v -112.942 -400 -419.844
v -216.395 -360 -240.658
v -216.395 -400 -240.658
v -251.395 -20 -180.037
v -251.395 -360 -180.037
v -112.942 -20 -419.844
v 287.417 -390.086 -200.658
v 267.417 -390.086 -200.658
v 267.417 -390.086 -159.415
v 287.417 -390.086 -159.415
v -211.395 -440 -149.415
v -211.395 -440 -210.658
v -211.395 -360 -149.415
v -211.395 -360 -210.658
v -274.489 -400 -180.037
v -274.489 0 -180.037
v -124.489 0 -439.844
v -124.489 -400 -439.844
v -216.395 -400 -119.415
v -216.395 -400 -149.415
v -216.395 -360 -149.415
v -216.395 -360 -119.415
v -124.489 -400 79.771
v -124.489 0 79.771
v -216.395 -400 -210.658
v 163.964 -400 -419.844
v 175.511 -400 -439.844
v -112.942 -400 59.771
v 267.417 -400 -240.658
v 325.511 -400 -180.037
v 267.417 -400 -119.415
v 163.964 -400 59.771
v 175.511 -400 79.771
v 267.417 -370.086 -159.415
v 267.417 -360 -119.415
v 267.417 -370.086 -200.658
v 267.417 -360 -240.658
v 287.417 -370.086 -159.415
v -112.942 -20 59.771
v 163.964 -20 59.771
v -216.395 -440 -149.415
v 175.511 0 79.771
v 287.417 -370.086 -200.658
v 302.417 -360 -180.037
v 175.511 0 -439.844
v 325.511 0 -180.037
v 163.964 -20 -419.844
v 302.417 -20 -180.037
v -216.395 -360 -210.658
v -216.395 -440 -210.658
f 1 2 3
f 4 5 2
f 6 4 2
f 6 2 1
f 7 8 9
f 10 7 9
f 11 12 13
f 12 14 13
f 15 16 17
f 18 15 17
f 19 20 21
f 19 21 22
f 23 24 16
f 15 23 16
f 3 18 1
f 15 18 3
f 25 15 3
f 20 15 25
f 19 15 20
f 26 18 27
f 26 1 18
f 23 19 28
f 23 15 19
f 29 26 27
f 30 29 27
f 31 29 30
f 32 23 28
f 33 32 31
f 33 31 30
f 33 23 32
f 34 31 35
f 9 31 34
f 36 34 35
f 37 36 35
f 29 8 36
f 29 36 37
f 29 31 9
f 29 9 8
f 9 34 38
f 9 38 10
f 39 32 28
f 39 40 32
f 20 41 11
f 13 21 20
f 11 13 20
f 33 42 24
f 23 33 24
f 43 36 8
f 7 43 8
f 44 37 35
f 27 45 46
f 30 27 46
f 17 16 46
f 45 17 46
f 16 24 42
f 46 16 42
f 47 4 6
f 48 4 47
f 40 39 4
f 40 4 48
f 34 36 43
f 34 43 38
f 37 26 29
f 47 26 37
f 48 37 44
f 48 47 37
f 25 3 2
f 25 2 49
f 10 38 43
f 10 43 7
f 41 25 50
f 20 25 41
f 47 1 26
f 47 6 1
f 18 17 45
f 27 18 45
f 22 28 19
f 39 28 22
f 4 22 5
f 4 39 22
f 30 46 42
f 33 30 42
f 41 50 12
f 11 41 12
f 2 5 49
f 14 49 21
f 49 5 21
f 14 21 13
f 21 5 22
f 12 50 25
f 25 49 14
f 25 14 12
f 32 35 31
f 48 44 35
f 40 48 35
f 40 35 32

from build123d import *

# Parameters (mm, degrees)
F1_DEPTH  = 400
F2_T      = -20
F4_DEPTH  = 40
F5_W      = 40
F5_H      = 61.2435565298
F6_DEPTH  = 5
F7_W      = 5
F7_H      = 61.2435565298
F8_DEPTH  = 40
F9_W      = 20
F9_H      = 41.2435565298
F10_DEPTH = 20


with BuildPart() as f1:
    # F0 (on Front) → F1 (new body)
    with BuildSketch(Plane.XZ):
        Polygon((175.5110102277, 79.7711170535), (-124.4889897723, 79.7711170535), (-274.4889897723, -180.0365040818), (-124.4889897723, -439.8441252172), (175.5110102277, -439.8441252172), (325.5110102277, -180.0365040818), align=None)
    extrude(amount=F1_DEPTH)

    # F2
    f2_openings = [f1.faces().sort_by_distance(p)[0] for p in [
        (25.51101, -400, -180.036504),
    ]]
    offset(amount=F2_T, openings=f2_openings)

    # F3 (on face) → F4 (join)
    with BuildSketch(Plane.XZ.offset(400)):
        Polygon((175.5110102277, -439.8441252172), (325.5110102277, -180.0365040818), (175.5110102277, 79.7711170535), (-124.4889897723, 79.7711170535), (-274.4889897723, -180.0365040818), (-124.4889897723, -439.8441252172), align=None)
        Polygon((-216.3949790047, -240.6582823468), (-251.3949790047, -180.0365040818), (-216.3949790047, -119.4147258169), (-112.9419843885, 59.7711170535), (163.9640048439, 59.7711170535), (267.4169994601, -119.4147258169), (302.4169994601, -180.0365040818), (267.4169994601, -240.6582823468), (163.9640048439, -419.8441252172), (-112.9419843885, -419.8441252172), align=None, mode=Mode.SUBTRACT)
        Polygon((-216.3949790047, -119.4147258169), (-251.3949790047, -180.0365040818), (-216.3949790047, -240.6582823468), align=None)
        Polygon((302.4169994601, -180.0365040818), (267.4169994601, -119.4147258169), (267.4169994601, -240.6582823468), align=None)
    extrude(amount=-F4_DEPTH)

    # F5 (on face) → F6 (join)
    with BuildSketch(Plane.YZ.offset(-216.3949790047)):
        with Locations((-380, -180.0365040818)):
            Rectangle(F5_W, F5_H)
    extrude(amount=F6_DEPTH)

    # F7 (on face) → F8 (join)
    with BuildSketch(Plane.XZ.offset(400)):
        with Locations((-213.8949790047, -180.0365040818)):
            Rectangle(F7_W, F7_H)
    extrude(amount=F8_DEPTH)

    # F9 (on face) → F10 (cut)
    with BuildSketch(Plane(origin=(267.4169994601, 0, 0), x_dir=(0, -1, 0), z_dir=(-1, 0, 0))):
        with Locations((380.0858259201, -180.0365040818)):
            Rectangle(F9_W, F9_H)
    extrude(amount=-F10_DEPTH, mode=Mode.SUBTRACT)


solid = f1.part
